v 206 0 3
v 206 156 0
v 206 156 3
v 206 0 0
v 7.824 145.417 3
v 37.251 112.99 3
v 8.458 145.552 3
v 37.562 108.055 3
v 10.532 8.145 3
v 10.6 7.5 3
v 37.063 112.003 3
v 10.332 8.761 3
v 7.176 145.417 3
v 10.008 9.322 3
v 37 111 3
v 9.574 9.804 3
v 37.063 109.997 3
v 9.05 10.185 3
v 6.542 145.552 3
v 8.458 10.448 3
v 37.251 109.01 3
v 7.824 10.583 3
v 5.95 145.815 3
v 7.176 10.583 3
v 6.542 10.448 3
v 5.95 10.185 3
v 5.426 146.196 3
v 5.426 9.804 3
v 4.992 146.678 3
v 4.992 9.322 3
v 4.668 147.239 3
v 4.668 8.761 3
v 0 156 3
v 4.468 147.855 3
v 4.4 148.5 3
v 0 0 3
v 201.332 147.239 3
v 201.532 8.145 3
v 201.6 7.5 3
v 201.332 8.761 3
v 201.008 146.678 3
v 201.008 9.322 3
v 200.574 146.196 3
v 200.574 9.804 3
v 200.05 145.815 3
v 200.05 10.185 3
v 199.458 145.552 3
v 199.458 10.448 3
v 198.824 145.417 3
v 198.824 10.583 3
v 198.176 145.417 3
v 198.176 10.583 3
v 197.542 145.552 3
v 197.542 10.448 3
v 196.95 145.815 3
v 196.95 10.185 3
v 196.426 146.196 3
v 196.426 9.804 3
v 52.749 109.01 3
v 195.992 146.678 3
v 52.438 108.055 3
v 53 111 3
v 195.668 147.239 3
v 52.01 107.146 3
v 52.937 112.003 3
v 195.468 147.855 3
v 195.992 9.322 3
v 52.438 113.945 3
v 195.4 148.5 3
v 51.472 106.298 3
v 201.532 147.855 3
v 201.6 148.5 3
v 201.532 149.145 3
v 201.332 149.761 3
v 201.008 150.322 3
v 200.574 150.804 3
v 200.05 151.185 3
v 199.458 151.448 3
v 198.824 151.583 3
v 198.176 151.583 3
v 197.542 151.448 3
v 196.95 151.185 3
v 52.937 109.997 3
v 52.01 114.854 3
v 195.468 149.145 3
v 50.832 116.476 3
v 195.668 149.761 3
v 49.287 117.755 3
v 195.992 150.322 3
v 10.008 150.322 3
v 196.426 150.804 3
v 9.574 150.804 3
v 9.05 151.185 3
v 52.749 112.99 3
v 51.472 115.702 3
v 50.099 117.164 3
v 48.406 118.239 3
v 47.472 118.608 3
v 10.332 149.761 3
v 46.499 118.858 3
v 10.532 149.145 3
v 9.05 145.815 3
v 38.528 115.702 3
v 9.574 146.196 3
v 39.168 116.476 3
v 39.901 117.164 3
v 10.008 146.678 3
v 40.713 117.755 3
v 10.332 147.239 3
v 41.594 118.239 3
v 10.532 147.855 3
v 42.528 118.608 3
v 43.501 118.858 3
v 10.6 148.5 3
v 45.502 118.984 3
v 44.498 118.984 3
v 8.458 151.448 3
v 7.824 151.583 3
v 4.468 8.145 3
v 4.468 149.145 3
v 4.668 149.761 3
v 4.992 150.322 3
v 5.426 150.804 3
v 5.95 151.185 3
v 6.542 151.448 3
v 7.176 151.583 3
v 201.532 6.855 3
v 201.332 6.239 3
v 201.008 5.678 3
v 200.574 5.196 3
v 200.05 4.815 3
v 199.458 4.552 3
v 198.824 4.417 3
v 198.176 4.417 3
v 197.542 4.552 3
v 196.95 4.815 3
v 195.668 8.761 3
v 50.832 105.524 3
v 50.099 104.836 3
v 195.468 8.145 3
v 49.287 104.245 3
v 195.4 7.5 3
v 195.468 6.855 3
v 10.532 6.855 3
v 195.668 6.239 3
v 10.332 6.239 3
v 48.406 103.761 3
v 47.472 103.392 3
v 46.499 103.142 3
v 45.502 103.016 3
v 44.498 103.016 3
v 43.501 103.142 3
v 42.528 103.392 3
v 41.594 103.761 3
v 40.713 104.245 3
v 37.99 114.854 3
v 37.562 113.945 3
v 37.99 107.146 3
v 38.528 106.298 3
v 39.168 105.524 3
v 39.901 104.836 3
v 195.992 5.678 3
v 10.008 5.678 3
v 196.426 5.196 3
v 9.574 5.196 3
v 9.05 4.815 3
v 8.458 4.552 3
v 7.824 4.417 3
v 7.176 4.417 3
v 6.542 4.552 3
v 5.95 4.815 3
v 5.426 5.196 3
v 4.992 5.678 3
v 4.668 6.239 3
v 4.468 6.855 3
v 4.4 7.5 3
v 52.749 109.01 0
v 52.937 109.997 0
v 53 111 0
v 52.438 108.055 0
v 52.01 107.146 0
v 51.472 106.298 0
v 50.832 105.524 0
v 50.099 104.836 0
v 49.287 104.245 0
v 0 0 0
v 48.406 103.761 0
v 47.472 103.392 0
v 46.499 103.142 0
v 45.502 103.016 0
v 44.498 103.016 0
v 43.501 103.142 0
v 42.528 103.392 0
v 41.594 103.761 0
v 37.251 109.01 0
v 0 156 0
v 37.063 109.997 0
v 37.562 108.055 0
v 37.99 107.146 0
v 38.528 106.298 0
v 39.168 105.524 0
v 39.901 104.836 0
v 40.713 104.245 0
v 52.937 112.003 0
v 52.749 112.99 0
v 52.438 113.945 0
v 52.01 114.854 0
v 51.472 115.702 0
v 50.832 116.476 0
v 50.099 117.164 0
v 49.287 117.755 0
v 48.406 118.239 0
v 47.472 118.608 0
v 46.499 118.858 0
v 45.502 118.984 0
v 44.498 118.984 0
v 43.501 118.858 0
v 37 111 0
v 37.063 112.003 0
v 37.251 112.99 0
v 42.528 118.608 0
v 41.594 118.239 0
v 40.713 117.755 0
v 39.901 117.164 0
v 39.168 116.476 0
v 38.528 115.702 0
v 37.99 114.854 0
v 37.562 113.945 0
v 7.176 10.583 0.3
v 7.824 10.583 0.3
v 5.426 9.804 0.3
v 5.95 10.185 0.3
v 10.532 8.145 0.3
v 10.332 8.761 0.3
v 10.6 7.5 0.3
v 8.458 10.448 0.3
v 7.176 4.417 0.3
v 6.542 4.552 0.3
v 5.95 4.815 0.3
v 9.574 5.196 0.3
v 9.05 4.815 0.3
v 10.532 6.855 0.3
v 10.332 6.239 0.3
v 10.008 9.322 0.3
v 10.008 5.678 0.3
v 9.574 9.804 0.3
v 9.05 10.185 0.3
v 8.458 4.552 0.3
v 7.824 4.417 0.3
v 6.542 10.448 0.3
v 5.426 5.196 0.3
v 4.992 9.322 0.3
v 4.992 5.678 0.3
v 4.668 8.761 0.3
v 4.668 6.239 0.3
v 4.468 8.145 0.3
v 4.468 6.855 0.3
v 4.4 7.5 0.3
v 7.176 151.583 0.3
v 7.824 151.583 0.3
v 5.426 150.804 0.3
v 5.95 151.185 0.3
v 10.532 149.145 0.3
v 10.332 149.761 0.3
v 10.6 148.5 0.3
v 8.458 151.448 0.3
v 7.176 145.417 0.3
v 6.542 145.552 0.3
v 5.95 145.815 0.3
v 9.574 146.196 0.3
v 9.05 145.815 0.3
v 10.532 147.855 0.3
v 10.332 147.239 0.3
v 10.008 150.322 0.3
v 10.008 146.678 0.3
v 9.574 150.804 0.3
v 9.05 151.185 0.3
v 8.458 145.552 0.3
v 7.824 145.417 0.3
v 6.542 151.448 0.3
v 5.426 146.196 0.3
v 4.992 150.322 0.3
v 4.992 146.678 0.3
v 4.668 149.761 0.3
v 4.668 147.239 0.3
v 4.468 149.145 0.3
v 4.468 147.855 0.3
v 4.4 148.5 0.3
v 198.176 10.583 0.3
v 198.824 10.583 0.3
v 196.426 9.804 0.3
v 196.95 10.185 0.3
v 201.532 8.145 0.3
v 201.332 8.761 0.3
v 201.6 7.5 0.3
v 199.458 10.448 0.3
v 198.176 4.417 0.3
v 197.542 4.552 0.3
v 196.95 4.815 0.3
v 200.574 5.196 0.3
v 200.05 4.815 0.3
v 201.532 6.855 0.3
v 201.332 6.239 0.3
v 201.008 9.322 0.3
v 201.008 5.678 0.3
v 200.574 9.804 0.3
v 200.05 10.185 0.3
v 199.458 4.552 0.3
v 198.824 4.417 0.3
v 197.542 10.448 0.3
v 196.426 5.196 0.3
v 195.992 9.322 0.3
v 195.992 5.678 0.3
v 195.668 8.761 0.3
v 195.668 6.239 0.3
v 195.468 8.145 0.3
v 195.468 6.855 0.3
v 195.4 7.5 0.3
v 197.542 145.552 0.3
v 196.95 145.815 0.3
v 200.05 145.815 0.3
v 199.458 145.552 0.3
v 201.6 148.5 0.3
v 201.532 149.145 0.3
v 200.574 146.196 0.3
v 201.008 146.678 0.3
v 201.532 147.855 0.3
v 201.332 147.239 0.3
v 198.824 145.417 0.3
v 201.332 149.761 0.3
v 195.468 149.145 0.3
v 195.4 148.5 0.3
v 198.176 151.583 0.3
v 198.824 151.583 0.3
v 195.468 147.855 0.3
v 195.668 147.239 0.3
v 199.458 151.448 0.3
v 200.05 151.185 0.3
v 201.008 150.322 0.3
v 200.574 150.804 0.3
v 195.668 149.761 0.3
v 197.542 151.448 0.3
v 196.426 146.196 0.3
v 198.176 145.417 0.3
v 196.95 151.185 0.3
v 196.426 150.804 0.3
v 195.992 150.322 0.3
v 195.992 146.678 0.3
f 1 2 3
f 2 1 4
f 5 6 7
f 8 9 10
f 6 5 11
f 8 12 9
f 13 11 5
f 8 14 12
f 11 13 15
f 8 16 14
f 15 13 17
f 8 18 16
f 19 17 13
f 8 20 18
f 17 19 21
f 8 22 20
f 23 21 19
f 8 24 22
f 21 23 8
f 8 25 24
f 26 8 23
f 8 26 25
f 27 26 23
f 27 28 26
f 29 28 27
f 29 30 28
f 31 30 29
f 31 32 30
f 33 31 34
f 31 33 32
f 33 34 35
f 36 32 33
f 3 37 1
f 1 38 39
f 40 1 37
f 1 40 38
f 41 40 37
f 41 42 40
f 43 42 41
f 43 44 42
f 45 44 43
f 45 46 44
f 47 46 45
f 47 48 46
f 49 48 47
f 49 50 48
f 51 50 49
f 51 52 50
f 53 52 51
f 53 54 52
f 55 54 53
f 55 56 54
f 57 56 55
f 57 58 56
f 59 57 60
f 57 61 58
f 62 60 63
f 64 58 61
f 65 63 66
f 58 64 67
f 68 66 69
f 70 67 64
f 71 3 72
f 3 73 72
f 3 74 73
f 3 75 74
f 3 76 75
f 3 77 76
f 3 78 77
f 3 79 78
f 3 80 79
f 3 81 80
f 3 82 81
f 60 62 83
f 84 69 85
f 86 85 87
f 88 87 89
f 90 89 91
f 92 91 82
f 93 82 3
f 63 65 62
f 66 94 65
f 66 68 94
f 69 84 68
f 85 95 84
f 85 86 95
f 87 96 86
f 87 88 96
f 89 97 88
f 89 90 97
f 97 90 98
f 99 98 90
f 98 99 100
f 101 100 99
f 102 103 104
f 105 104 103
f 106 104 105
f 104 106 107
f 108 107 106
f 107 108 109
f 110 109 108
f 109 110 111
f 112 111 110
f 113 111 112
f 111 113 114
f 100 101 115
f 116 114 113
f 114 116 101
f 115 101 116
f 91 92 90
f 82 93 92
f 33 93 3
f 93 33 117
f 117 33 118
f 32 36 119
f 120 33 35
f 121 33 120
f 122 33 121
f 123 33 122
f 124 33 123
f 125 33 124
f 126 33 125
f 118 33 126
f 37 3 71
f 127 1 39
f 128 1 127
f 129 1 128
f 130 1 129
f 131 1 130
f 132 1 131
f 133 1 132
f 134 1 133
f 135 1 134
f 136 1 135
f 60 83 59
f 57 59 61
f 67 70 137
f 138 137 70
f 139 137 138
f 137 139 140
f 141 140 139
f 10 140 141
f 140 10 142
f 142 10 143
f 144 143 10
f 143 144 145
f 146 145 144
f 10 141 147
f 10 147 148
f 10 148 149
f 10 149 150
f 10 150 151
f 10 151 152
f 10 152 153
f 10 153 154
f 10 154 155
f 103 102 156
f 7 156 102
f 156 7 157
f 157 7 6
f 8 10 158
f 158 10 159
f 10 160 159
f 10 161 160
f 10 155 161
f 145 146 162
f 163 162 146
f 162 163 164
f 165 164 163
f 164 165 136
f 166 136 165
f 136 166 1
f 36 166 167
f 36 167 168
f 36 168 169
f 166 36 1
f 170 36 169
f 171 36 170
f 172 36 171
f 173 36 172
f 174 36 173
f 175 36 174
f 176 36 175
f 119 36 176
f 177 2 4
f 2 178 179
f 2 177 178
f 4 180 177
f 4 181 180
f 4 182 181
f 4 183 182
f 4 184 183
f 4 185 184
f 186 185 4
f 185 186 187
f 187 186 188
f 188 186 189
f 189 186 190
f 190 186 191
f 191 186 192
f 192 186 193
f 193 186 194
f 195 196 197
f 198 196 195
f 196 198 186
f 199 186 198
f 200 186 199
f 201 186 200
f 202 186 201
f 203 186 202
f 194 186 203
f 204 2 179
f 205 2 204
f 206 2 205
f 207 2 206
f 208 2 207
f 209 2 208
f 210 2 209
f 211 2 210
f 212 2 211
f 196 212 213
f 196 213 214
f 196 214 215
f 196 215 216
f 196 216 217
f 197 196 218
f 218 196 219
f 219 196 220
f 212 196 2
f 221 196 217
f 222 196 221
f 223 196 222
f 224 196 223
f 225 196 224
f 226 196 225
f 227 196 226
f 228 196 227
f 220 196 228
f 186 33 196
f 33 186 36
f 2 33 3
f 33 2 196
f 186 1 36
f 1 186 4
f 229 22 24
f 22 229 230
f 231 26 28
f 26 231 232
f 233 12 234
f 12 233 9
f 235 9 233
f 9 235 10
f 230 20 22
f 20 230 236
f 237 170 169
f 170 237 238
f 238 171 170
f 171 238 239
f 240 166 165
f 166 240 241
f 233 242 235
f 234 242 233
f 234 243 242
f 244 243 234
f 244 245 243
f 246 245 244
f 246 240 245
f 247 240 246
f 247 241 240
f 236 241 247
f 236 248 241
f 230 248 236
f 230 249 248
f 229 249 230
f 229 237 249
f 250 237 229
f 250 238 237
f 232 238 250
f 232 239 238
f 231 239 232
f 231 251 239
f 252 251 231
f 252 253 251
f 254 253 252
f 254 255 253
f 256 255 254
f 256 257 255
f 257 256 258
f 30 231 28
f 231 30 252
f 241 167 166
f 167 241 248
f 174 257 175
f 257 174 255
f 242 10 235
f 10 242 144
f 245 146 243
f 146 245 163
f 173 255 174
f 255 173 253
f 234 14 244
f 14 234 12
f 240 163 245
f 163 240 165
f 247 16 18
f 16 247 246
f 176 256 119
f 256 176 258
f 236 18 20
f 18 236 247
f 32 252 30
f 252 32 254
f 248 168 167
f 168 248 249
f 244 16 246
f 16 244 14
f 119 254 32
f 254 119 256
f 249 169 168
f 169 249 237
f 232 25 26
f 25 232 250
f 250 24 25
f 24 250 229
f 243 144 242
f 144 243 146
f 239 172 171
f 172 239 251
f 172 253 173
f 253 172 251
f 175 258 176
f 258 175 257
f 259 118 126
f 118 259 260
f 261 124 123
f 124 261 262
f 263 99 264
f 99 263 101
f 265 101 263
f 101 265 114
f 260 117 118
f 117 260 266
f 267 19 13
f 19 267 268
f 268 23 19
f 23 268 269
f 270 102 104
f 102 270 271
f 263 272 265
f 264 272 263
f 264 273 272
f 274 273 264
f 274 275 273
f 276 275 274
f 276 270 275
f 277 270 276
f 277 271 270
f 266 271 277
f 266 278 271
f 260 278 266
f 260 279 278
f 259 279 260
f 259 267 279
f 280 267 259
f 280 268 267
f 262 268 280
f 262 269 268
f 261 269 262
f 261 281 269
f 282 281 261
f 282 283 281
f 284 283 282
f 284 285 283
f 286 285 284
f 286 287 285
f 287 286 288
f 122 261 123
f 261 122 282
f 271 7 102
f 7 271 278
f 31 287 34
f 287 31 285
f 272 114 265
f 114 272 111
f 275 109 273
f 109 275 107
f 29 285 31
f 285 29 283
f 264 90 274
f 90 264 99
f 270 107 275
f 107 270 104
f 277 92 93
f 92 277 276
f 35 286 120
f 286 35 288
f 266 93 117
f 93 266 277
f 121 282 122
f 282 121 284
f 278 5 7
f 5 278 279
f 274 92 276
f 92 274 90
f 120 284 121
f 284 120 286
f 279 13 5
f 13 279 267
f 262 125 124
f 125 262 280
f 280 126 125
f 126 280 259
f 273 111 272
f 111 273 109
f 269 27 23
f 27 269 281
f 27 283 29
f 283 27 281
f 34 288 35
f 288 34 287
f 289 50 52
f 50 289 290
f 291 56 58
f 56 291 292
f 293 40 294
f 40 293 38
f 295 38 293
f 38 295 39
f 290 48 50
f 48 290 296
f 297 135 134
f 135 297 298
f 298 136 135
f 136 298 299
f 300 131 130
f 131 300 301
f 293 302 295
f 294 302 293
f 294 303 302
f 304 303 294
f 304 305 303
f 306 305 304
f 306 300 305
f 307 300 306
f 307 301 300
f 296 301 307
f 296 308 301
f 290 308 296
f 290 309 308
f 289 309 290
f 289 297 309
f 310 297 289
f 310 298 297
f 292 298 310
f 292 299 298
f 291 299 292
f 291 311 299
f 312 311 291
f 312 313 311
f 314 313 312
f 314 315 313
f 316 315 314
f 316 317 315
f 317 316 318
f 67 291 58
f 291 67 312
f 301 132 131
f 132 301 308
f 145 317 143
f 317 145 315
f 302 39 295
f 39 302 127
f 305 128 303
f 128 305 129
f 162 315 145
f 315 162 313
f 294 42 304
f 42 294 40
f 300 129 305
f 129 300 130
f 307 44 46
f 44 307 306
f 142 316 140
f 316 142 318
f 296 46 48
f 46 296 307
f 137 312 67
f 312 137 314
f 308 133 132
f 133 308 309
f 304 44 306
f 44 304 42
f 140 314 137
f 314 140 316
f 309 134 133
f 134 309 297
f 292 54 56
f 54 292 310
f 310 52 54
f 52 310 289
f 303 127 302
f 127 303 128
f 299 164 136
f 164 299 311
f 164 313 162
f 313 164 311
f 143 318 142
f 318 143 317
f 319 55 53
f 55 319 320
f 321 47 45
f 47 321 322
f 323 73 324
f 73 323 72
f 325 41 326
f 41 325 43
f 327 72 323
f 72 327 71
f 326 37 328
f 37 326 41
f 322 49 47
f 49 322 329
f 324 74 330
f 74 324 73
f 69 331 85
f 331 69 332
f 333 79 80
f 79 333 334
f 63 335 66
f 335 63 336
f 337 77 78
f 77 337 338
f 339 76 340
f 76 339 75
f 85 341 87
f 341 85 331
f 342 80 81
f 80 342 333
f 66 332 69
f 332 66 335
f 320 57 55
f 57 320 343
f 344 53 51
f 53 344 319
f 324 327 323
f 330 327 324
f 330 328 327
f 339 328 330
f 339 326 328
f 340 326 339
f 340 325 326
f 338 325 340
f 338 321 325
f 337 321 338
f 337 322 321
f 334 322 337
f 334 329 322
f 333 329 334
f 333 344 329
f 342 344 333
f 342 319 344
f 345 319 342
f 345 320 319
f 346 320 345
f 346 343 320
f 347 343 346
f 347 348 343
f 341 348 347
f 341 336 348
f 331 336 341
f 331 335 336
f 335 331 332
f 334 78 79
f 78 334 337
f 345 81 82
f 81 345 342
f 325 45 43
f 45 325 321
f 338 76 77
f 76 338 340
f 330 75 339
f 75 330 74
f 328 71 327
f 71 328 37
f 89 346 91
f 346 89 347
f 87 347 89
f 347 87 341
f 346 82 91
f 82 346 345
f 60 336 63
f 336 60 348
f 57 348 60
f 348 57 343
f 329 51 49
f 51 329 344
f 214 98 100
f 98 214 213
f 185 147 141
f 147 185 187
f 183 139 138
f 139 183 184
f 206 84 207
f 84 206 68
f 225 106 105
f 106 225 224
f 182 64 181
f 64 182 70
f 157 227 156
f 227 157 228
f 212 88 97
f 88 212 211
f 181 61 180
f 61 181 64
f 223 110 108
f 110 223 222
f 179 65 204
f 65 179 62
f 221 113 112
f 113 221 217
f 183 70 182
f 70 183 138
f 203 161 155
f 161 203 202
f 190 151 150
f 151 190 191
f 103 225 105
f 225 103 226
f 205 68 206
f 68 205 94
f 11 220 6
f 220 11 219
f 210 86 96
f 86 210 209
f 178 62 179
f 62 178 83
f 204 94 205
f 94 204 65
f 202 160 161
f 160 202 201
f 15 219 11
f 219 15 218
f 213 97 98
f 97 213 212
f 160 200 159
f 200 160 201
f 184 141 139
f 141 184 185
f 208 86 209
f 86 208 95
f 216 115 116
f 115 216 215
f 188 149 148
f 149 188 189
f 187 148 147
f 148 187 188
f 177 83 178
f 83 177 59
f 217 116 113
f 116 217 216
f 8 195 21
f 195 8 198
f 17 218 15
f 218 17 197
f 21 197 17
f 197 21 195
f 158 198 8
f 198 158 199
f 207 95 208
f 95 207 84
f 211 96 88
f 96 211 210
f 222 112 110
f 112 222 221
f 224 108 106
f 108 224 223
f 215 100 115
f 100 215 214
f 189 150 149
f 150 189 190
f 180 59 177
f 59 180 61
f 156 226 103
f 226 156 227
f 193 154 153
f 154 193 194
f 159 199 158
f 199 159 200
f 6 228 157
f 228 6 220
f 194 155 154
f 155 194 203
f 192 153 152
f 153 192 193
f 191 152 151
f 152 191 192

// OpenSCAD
height = 150;
width = 100;

panel_height = height + 56;
panel_width = width + 56;

difference() {
    cube([panel_height, panel_width, 3]);

    translate([7.5, 7.5, 0.3]) cylinder(h = 6, r = 3.1, $fn = 30);
    translate([7.5, panel_width - 7.5, 0.3]) cylinder(h = 6, r = 3.1, $fn = 30);
    translate([panel_height - 7.5, 7.5, 0.3]) cylinder(h = 6, r = 3.1, $fn = 30);
    translate([panel_height - 7.5, panel_width - 7.5, 0.3]) cylinder(h = 6, r = 3.1, $fn = 30);
    
    translate([45, panel_width - 45, 0]) cylinder(h = 6, r = 8, $fn = 50);
}
